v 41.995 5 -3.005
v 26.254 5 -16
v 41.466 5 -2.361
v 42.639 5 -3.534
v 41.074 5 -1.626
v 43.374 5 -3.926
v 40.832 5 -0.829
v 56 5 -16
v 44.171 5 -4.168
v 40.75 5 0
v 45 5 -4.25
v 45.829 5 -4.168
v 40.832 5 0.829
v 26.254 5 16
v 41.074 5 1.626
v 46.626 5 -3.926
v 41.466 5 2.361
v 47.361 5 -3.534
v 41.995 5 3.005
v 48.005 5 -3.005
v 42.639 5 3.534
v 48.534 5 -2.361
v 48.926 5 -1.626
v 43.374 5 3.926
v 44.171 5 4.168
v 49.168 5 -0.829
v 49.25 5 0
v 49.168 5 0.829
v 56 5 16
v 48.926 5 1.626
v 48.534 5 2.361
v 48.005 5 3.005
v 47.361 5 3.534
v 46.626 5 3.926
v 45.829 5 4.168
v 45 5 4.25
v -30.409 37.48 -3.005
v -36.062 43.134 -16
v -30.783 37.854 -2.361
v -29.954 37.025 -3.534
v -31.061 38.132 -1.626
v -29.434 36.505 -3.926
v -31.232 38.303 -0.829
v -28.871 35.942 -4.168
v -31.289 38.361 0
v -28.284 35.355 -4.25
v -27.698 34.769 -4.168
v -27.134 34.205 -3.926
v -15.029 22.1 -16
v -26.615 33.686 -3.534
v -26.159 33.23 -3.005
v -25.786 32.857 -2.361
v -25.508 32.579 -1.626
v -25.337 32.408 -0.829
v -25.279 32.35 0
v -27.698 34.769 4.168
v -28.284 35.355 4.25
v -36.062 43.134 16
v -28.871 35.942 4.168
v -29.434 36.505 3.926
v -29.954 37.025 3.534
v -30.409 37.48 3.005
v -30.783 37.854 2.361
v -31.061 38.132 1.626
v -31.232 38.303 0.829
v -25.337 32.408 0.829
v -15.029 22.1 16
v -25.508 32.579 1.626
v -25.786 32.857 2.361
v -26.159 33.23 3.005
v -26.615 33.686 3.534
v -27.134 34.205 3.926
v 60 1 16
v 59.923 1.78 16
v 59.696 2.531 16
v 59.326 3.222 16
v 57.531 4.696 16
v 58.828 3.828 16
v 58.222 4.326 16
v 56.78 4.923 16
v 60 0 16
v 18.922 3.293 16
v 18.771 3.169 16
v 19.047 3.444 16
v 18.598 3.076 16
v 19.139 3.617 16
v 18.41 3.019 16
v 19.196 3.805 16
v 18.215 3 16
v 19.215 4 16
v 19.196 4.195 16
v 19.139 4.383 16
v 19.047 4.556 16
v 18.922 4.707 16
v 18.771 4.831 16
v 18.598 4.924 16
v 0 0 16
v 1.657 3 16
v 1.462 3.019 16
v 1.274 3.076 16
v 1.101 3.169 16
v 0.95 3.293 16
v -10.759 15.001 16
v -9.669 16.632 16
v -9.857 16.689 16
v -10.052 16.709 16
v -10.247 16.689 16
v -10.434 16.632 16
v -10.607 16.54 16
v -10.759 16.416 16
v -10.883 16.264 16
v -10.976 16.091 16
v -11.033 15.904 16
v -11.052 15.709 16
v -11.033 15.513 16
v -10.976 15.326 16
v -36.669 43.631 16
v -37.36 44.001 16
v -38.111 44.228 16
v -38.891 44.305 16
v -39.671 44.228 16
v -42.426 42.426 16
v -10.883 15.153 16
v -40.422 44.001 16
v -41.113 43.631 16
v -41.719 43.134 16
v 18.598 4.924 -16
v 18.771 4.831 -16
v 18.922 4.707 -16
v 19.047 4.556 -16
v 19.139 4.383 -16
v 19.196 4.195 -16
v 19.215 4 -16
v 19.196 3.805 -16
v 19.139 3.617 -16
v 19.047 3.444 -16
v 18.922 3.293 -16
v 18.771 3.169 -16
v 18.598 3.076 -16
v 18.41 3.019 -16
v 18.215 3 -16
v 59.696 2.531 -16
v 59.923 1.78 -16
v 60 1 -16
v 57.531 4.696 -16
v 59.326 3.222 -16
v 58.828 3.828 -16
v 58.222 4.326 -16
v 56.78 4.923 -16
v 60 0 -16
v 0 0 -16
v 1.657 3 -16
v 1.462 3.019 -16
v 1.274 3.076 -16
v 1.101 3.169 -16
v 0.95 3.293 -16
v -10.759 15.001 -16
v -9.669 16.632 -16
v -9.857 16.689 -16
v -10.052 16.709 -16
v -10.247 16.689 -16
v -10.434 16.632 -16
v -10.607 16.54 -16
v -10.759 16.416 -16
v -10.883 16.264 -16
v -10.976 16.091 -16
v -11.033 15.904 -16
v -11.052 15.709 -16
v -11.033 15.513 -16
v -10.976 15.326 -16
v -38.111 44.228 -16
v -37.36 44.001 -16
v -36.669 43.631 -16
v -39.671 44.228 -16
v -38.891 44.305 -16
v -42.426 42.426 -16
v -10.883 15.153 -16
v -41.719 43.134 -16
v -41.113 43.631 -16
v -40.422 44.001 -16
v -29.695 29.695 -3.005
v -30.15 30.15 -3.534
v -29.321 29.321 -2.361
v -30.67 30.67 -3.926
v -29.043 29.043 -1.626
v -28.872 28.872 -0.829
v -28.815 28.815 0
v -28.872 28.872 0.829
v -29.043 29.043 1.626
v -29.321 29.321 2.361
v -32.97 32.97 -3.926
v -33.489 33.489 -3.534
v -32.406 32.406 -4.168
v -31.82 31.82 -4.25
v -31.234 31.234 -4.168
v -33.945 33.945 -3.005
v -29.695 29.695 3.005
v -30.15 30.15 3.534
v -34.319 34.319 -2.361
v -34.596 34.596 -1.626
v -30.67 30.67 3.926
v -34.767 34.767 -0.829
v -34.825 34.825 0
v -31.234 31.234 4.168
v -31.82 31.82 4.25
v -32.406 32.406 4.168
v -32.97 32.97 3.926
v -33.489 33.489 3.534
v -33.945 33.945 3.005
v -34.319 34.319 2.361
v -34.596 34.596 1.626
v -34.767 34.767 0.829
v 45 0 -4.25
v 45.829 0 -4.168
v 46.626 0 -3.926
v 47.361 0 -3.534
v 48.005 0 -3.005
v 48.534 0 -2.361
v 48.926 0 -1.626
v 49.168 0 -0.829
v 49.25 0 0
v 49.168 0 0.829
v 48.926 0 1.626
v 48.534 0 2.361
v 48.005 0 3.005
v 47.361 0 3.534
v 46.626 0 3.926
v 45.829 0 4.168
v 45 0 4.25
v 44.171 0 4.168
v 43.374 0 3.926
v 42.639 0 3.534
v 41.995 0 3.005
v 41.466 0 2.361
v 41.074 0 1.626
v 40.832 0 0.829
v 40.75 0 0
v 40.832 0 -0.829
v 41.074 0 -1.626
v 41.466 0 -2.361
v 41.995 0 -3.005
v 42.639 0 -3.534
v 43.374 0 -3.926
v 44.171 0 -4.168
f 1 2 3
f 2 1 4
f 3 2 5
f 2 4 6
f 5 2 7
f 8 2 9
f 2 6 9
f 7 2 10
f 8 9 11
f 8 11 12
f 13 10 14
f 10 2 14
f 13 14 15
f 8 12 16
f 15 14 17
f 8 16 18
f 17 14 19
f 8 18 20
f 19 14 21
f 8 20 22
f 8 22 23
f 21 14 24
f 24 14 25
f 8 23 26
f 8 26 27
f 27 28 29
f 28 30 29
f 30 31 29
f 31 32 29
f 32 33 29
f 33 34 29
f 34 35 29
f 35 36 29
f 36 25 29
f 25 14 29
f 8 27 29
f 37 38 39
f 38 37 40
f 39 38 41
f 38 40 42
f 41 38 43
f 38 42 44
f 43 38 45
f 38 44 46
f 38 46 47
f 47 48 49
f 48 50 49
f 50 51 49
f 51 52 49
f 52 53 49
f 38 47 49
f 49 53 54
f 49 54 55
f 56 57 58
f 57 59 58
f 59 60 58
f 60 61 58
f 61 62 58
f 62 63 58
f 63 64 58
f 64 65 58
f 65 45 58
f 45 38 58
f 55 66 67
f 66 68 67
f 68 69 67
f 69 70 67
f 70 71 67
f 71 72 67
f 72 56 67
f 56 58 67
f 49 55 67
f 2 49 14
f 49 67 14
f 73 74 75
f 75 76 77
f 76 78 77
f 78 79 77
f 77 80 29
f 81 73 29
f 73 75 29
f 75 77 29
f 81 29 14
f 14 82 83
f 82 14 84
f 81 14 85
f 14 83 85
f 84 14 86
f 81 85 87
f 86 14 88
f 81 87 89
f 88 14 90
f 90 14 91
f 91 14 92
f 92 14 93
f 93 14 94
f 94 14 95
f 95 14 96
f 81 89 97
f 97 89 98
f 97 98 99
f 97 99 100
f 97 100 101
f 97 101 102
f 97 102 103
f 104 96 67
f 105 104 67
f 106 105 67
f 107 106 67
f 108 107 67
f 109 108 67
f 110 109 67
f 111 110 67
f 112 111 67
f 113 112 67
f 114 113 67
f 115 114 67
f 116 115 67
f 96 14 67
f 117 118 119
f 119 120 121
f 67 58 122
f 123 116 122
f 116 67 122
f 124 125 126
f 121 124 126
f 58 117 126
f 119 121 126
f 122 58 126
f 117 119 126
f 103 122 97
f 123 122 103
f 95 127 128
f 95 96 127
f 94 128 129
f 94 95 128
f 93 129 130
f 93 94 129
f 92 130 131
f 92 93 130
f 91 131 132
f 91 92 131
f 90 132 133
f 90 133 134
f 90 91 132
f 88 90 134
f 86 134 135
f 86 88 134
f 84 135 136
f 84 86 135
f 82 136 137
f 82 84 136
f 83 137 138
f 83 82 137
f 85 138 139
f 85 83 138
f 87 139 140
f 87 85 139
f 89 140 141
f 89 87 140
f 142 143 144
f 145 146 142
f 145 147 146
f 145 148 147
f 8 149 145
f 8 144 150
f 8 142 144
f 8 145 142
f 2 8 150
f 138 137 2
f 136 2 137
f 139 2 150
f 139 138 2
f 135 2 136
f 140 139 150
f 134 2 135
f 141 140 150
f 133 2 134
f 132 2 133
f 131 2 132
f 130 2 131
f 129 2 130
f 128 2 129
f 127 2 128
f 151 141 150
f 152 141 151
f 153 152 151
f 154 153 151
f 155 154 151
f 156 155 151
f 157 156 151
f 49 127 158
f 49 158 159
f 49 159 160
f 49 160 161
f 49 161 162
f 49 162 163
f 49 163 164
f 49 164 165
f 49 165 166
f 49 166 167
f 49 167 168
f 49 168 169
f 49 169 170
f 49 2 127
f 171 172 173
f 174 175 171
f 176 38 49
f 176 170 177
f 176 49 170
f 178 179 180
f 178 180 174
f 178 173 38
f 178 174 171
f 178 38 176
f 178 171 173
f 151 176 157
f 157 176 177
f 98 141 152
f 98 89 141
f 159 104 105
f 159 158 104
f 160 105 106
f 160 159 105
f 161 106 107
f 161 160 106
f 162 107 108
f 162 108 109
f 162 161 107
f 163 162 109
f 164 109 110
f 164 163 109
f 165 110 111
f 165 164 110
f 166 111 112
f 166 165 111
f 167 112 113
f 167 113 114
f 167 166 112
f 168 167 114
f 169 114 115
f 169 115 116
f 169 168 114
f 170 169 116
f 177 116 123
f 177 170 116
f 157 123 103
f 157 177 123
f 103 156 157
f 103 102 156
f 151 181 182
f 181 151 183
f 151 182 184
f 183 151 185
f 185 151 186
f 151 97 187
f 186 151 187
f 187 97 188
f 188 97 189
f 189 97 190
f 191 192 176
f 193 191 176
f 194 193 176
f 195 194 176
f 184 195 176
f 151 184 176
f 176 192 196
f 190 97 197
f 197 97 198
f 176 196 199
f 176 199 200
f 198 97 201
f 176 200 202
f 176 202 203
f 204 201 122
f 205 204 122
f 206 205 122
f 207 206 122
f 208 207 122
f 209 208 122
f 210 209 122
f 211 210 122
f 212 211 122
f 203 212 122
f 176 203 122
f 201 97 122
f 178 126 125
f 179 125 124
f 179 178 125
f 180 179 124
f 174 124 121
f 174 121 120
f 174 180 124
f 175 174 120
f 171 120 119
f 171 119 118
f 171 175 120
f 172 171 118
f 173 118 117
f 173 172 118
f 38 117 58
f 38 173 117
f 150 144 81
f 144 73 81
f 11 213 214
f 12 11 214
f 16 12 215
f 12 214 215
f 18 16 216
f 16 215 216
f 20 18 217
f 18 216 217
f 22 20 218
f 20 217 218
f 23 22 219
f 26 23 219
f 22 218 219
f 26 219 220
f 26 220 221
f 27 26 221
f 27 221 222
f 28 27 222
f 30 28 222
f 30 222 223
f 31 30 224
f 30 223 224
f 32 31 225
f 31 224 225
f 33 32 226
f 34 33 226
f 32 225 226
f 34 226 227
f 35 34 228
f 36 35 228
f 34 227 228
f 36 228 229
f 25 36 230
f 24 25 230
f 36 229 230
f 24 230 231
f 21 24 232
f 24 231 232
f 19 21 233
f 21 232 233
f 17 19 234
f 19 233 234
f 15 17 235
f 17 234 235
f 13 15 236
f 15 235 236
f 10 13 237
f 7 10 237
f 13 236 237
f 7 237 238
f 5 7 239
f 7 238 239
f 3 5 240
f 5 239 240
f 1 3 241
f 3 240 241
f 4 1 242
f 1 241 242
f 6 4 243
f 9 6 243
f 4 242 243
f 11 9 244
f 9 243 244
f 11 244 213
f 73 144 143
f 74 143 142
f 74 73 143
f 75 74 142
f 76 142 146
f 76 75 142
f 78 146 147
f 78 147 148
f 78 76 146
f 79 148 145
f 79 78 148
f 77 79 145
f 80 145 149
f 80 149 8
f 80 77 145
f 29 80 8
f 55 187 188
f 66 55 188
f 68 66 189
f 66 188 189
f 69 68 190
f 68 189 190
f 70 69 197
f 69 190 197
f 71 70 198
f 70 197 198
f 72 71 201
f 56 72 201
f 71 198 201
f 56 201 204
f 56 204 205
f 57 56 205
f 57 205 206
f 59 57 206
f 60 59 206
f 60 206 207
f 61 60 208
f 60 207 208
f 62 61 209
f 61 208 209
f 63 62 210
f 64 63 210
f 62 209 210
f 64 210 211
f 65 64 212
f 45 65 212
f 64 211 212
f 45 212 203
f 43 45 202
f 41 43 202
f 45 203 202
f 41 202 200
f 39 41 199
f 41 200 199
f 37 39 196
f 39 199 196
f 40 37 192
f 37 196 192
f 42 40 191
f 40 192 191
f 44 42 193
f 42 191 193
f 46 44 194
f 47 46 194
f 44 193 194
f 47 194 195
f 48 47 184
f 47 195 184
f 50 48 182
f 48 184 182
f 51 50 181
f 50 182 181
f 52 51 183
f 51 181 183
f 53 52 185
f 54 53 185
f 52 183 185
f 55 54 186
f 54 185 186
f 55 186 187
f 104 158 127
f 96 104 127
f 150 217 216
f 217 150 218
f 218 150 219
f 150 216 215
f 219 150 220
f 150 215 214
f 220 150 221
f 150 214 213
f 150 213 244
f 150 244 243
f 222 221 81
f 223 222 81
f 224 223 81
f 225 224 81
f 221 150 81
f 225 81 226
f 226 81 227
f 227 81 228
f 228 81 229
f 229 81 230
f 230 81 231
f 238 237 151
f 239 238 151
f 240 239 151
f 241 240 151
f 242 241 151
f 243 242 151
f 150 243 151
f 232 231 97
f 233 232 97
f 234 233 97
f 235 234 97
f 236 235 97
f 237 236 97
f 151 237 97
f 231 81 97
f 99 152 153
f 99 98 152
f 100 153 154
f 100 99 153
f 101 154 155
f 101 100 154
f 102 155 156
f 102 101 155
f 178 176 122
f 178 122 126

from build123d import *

# Parameters (mm, degrees)
EXTRUDE_1_DEPTH     = 16
SKETCH_2_R          = 4.25
CUT_EXTRUDE_1_DEPTH = 5
SKETCH_3_R          = 4.25
CUT_EXTRUDE_2_DEPTH = 5
FILLET_1_R          = 4
FILLET_2_R          = 1


with BuildPart() as part:
    # Эскиз1 → Бобышка-Вытянуть1 (new body, symmetric)
    with BuildSketch(Plane.XY):
        Polygon((0, 0), (-42.426406871, 42.426406871), (-38.890872965, 45.961940777), (-15.028558569, 22.099626381), (26.253591352, 5), (60, 5), (60, 0), align=None)
        Polygon((-14.313708499, 18.556349186), (23.242640687, 3), (1.242640687, 3), align=None, mode=Mode.SUBTRACT)
    extrude(amount=EXTRUDE_1_DEPTH, both=True)

    # Эскиз2 → Вырез-Вытянуть1 (cut)
    with BuildSketch(Plane(origin=(0, 0, 0), x_dir=(0, 0, 1), z_dir=(-0.707106781, -0.707106781, 0))):
        with Locations(Location((0, 45, 0), (0, 0, 270))):  # turned: the seam where the file's is
            Circle(SKETCH_2_R)
    extrude(amount=-CUT_EXTRUDE_1_DEPTH, mode=Mode.SUBTRACT)

    # Эскиз3 → Вырез-Вытянуть2 (cut)
    with BuildSketch(Plane.XZ):
        with Locations(Location((45, 0, 0), (0, 0, 270))):  # turned: the seam where the file's is
            Circle(SKETCH_3_R)
    extrude(amount=-CUT_EXTRUDE_2_DEPTH, mode=Mode.SUBTRACT)

    # Скругление1
    fillet_1_edges = [part.edges().sort_by_distance(p)[0] for p in [
        (-38.890872965, 45.961940777, 0),
        (60, 5, 0),
    ]]
    fillet(fillet_1_edges, radius=FILLET_1_R)

    # Скругление2
    fillet_2_edges = [part.edges().sort_by_distance(p)[0] for p in [
        (-14.313708499, 18.556349186, 0),
        (1.242640687, 3, 0),
        (23.242640687, 3, 0),
    ]]
    fillet(fillet_2_edges, radius=FILLET_2_R)


solid = part.part
